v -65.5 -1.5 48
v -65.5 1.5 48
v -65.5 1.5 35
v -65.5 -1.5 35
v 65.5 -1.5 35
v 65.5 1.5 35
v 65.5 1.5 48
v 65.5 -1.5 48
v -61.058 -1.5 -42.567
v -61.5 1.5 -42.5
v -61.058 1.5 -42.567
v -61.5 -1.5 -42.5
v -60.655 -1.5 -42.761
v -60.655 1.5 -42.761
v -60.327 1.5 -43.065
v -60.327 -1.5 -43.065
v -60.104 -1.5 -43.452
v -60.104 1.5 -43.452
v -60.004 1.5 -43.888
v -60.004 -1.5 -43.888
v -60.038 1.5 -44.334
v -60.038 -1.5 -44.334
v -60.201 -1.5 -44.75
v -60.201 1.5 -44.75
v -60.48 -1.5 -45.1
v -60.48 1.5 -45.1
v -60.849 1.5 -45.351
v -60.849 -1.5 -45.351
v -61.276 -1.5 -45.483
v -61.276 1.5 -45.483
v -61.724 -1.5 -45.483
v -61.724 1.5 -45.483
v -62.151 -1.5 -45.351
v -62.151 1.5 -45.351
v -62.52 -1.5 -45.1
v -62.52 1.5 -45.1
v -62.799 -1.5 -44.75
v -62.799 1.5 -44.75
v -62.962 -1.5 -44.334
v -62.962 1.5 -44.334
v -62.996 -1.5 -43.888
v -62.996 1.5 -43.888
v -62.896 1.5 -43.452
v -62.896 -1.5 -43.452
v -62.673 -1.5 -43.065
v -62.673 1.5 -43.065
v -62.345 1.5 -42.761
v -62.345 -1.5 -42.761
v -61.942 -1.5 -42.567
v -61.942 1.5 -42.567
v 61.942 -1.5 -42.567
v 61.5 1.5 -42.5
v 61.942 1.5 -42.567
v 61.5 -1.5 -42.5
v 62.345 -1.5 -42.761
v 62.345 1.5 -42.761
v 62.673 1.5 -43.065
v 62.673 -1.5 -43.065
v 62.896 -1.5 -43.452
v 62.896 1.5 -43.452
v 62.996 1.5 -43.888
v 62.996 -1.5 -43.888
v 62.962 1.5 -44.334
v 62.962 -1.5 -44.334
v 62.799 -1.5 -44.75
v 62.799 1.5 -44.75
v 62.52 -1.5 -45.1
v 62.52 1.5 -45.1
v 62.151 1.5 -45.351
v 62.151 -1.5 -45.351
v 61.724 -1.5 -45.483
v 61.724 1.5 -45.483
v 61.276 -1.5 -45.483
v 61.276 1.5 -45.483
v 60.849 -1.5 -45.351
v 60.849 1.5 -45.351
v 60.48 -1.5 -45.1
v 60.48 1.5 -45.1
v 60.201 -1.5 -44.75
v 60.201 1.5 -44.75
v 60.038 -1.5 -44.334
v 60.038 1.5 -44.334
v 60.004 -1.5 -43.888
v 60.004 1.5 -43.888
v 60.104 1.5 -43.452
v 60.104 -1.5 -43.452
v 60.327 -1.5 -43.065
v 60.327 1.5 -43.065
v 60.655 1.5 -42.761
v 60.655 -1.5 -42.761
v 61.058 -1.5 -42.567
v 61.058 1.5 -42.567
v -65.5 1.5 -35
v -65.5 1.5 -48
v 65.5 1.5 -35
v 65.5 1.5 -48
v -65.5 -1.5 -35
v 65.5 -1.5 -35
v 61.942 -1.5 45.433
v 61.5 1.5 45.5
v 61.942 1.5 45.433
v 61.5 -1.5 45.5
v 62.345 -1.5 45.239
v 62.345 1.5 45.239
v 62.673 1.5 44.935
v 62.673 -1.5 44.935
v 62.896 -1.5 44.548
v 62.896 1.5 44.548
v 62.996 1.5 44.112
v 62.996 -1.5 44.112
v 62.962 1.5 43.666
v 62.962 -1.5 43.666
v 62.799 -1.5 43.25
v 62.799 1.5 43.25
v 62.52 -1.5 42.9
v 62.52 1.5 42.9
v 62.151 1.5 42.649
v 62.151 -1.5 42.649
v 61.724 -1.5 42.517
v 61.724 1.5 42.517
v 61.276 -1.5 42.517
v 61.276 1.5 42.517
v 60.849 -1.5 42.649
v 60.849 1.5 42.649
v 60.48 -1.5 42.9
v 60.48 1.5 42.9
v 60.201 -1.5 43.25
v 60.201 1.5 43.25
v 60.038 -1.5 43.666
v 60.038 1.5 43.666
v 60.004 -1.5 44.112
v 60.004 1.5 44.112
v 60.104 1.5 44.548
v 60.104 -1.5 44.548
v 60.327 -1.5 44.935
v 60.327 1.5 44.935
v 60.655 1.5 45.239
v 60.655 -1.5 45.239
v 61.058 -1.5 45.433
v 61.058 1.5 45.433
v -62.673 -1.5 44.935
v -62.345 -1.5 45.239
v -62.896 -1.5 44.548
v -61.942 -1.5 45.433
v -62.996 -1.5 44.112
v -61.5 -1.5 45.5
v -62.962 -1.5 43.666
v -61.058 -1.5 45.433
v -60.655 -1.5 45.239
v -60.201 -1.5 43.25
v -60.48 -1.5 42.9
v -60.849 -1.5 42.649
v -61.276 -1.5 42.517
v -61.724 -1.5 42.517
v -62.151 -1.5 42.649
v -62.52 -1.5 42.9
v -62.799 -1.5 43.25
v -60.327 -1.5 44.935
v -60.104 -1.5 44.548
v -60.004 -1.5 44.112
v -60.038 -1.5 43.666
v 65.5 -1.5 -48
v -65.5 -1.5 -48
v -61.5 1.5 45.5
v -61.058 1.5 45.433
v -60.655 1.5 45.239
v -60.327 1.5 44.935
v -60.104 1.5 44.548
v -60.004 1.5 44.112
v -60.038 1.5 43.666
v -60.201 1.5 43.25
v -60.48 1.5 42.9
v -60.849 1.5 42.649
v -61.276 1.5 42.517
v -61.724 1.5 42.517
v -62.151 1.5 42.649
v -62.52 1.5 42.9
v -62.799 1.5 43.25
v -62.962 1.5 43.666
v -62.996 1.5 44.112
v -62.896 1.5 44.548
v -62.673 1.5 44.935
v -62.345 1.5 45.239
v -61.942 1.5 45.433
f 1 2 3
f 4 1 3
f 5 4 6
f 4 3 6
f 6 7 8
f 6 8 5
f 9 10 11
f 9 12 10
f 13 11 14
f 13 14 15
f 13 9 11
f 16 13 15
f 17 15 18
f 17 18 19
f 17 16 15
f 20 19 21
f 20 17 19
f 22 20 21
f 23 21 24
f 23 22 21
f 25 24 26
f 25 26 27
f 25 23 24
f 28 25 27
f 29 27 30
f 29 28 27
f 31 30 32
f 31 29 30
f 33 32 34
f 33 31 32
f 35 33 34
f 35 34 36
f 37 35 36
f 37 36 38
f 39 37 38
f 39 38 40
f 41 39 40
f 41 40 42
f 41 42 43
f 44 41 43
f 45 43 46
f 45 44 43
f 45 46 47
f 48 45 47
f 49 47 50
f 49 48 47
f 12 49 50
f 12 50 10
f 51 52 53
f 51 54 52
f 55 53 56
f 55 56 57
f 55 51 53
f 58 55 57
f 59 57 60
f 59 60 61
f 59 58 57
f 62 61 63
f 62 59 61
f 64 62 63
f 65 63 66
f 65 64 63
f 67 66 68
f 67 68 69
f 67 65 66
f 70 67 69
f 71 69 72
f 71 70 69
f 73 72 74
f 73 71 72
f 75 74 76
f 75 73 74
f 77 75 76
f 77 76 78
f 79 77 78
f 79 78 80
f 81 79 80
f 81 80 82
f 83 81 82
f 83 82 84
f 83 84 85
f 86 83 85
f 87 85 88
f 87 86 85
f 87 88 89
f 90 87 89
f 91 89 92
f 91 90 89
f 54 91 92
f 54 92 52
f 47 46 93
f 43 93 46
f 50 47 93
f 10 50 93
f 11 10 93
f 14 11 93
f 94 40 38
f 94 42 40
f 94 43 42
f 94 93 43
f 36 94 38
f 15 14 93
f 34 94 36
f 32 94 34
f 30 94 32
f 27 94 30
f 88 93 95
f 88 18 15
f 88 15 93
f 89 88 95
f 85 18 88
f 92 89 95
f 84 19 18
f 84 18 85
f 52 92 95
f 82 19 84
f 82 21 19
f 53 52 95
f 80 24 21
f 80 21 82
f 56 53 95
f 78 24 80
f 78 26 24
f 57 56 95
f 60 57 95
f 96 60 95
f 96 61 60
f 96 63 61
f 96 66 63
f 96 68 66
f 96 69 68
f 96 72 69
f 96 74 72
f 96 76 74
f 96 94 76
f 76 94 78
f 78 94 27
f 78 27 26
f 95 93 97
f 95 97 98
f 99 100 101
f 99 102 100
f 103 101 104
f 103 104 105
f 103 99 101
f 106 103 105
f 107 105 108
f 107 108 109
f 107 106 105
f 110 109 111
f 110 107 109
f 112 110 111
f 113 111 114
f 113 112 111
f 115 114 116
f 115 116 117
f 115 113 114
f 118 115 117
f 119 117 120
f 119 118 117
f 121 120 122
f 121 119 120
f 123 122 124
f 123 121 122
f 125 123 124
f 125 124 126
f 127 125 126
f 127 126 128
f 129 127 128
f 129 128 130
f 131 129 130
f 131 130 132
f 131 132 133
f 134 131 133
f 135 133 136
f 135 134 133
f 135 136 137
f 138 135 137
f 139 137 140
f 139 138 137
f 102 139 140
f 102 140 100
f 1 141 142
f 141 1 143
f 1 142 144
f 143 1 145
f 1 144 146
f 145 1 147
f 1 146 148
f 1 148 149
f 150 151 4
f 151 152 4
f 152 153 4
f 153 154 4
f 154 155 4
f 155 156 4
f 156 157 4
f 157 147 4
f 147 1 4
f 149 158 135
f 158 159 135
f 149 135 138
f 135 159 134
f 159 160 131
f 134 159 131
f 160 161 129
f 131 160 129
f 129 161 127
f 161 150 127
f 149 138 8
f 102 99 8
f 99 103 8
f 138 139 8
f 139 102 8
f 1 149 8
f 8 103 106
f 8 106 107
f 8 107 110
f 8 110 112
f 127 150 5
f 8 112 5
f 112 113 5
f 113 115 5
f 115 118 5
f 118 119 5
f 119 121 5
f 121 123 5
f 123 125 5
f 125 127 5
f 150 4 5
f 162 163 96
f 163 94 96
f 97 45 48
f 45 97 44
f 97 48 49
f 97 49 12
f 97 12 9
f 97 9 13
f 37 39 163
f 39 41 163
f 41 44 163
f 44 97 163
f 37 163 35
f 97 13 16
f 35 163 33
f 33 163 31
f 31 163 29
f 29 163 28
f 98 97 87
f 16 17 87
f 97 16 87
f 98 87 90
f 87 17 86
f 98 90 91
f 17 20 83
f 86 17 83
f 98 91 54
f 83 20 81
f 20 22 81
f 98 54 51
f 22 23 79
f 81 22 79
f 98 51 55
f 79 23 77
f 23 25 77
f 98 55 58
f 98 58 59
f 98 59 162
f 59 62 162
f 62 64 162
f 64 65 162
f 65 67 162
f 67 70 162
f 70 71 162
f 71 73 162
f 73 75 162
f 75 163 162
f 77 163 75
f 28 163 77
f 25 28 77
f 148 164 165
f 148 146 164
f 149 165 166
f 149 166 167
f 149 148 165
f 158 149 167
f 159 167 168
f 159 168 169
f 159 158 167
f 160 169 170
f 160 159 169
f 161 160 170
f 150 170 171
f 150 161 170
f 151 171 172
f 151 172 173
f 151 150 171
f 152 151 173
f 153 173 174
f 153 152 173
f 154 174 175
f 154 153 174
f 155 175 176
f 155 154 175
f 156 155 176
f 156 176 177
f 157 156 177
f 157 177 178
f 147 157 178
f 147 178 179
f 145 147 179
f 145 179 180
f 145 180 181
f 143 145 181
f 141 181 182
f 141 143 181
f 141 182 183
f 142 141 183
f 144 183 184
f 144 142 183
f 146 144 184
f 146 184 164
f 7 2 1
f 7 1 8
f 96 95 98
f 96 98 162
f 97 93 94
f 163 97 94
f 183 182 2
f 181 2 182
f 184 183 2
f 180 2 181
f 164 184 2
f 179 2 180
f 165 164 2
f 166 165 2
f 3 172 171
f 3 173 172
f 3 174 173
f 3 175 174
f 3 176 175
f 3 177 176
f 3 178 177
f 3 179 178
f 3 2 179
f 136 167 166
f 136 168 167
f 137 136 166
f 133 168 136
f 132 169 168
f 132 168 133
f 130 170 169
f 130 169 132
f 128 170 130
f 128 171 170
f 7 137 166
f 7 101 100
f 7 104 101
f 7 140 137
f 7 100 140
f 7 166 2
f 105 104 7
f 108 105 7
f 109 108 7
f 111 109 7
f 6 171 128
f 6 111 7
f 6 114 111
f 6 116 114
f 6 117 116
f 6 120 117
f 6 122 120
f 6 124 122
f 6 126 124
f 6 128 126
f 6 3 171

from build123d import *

# Parameters (mm, degrees)
SKETCH1_W             = 131
SKETCH1_H             = 13
SKETCH1_R             = 1.5
BOSS_EXTRUDE1_DEPTH   = 1.5
BOSS_EXTRUDE1_2_DEPTH = 1.5


with BuildPart() as part:
    # Sketch1 → Boss-Extrude1 (new, symmetric)
    with BuildSketch(Plane(origin=(0, 0, 0), x_dir=(1, 0, 0), z_dir=(0, 1, 0))):
        with Locations((0, -41.5)):
            Rectangle(SKETCH1_W, SKETCH1_H)
        with Locations(Location((-61.5, -44, 0), (0, 0, 270))):
            Circle(SKETCH1_R, mode=Mode.SUBTRACT)
        with Locations(Location((61.5, -44, 0), (0, 0, 270))):
            Circle(SKETCH1_R, mode=Mode.SUBTRACT)
    extrude(amount=BOSS_EXTRUDE1_DEPTH, both=True)


with BuildPart() as body_2:
    # Sketch1 → Boss-Extrude1 2 (new, symmetric)
    with BuildSketch(Plane(origin=(0, 0, 0), x_dir=(1, 0, 0), z_dir=(0, 1, 0))):
        with Locations((0, 41.5)):
            Rectangle(SKETCH1_W, SKETCH1_H)
        with Locations(Location((-61.5, 44, 0), (0, 0, 270))):
            Circle(SKETCH1_R, mode=Mode.SUBTRACT)
        with Locations(Location((61.5, 44, 0), (0, 0, 270))):
            Circle(SKETCH1_R, mode=Mode.SUBTRACT)
    extrude(amount=BOSS_EXTRUDE1_2_DEPTH, both=True)


solid = Compound([part.part, body_2.part])
